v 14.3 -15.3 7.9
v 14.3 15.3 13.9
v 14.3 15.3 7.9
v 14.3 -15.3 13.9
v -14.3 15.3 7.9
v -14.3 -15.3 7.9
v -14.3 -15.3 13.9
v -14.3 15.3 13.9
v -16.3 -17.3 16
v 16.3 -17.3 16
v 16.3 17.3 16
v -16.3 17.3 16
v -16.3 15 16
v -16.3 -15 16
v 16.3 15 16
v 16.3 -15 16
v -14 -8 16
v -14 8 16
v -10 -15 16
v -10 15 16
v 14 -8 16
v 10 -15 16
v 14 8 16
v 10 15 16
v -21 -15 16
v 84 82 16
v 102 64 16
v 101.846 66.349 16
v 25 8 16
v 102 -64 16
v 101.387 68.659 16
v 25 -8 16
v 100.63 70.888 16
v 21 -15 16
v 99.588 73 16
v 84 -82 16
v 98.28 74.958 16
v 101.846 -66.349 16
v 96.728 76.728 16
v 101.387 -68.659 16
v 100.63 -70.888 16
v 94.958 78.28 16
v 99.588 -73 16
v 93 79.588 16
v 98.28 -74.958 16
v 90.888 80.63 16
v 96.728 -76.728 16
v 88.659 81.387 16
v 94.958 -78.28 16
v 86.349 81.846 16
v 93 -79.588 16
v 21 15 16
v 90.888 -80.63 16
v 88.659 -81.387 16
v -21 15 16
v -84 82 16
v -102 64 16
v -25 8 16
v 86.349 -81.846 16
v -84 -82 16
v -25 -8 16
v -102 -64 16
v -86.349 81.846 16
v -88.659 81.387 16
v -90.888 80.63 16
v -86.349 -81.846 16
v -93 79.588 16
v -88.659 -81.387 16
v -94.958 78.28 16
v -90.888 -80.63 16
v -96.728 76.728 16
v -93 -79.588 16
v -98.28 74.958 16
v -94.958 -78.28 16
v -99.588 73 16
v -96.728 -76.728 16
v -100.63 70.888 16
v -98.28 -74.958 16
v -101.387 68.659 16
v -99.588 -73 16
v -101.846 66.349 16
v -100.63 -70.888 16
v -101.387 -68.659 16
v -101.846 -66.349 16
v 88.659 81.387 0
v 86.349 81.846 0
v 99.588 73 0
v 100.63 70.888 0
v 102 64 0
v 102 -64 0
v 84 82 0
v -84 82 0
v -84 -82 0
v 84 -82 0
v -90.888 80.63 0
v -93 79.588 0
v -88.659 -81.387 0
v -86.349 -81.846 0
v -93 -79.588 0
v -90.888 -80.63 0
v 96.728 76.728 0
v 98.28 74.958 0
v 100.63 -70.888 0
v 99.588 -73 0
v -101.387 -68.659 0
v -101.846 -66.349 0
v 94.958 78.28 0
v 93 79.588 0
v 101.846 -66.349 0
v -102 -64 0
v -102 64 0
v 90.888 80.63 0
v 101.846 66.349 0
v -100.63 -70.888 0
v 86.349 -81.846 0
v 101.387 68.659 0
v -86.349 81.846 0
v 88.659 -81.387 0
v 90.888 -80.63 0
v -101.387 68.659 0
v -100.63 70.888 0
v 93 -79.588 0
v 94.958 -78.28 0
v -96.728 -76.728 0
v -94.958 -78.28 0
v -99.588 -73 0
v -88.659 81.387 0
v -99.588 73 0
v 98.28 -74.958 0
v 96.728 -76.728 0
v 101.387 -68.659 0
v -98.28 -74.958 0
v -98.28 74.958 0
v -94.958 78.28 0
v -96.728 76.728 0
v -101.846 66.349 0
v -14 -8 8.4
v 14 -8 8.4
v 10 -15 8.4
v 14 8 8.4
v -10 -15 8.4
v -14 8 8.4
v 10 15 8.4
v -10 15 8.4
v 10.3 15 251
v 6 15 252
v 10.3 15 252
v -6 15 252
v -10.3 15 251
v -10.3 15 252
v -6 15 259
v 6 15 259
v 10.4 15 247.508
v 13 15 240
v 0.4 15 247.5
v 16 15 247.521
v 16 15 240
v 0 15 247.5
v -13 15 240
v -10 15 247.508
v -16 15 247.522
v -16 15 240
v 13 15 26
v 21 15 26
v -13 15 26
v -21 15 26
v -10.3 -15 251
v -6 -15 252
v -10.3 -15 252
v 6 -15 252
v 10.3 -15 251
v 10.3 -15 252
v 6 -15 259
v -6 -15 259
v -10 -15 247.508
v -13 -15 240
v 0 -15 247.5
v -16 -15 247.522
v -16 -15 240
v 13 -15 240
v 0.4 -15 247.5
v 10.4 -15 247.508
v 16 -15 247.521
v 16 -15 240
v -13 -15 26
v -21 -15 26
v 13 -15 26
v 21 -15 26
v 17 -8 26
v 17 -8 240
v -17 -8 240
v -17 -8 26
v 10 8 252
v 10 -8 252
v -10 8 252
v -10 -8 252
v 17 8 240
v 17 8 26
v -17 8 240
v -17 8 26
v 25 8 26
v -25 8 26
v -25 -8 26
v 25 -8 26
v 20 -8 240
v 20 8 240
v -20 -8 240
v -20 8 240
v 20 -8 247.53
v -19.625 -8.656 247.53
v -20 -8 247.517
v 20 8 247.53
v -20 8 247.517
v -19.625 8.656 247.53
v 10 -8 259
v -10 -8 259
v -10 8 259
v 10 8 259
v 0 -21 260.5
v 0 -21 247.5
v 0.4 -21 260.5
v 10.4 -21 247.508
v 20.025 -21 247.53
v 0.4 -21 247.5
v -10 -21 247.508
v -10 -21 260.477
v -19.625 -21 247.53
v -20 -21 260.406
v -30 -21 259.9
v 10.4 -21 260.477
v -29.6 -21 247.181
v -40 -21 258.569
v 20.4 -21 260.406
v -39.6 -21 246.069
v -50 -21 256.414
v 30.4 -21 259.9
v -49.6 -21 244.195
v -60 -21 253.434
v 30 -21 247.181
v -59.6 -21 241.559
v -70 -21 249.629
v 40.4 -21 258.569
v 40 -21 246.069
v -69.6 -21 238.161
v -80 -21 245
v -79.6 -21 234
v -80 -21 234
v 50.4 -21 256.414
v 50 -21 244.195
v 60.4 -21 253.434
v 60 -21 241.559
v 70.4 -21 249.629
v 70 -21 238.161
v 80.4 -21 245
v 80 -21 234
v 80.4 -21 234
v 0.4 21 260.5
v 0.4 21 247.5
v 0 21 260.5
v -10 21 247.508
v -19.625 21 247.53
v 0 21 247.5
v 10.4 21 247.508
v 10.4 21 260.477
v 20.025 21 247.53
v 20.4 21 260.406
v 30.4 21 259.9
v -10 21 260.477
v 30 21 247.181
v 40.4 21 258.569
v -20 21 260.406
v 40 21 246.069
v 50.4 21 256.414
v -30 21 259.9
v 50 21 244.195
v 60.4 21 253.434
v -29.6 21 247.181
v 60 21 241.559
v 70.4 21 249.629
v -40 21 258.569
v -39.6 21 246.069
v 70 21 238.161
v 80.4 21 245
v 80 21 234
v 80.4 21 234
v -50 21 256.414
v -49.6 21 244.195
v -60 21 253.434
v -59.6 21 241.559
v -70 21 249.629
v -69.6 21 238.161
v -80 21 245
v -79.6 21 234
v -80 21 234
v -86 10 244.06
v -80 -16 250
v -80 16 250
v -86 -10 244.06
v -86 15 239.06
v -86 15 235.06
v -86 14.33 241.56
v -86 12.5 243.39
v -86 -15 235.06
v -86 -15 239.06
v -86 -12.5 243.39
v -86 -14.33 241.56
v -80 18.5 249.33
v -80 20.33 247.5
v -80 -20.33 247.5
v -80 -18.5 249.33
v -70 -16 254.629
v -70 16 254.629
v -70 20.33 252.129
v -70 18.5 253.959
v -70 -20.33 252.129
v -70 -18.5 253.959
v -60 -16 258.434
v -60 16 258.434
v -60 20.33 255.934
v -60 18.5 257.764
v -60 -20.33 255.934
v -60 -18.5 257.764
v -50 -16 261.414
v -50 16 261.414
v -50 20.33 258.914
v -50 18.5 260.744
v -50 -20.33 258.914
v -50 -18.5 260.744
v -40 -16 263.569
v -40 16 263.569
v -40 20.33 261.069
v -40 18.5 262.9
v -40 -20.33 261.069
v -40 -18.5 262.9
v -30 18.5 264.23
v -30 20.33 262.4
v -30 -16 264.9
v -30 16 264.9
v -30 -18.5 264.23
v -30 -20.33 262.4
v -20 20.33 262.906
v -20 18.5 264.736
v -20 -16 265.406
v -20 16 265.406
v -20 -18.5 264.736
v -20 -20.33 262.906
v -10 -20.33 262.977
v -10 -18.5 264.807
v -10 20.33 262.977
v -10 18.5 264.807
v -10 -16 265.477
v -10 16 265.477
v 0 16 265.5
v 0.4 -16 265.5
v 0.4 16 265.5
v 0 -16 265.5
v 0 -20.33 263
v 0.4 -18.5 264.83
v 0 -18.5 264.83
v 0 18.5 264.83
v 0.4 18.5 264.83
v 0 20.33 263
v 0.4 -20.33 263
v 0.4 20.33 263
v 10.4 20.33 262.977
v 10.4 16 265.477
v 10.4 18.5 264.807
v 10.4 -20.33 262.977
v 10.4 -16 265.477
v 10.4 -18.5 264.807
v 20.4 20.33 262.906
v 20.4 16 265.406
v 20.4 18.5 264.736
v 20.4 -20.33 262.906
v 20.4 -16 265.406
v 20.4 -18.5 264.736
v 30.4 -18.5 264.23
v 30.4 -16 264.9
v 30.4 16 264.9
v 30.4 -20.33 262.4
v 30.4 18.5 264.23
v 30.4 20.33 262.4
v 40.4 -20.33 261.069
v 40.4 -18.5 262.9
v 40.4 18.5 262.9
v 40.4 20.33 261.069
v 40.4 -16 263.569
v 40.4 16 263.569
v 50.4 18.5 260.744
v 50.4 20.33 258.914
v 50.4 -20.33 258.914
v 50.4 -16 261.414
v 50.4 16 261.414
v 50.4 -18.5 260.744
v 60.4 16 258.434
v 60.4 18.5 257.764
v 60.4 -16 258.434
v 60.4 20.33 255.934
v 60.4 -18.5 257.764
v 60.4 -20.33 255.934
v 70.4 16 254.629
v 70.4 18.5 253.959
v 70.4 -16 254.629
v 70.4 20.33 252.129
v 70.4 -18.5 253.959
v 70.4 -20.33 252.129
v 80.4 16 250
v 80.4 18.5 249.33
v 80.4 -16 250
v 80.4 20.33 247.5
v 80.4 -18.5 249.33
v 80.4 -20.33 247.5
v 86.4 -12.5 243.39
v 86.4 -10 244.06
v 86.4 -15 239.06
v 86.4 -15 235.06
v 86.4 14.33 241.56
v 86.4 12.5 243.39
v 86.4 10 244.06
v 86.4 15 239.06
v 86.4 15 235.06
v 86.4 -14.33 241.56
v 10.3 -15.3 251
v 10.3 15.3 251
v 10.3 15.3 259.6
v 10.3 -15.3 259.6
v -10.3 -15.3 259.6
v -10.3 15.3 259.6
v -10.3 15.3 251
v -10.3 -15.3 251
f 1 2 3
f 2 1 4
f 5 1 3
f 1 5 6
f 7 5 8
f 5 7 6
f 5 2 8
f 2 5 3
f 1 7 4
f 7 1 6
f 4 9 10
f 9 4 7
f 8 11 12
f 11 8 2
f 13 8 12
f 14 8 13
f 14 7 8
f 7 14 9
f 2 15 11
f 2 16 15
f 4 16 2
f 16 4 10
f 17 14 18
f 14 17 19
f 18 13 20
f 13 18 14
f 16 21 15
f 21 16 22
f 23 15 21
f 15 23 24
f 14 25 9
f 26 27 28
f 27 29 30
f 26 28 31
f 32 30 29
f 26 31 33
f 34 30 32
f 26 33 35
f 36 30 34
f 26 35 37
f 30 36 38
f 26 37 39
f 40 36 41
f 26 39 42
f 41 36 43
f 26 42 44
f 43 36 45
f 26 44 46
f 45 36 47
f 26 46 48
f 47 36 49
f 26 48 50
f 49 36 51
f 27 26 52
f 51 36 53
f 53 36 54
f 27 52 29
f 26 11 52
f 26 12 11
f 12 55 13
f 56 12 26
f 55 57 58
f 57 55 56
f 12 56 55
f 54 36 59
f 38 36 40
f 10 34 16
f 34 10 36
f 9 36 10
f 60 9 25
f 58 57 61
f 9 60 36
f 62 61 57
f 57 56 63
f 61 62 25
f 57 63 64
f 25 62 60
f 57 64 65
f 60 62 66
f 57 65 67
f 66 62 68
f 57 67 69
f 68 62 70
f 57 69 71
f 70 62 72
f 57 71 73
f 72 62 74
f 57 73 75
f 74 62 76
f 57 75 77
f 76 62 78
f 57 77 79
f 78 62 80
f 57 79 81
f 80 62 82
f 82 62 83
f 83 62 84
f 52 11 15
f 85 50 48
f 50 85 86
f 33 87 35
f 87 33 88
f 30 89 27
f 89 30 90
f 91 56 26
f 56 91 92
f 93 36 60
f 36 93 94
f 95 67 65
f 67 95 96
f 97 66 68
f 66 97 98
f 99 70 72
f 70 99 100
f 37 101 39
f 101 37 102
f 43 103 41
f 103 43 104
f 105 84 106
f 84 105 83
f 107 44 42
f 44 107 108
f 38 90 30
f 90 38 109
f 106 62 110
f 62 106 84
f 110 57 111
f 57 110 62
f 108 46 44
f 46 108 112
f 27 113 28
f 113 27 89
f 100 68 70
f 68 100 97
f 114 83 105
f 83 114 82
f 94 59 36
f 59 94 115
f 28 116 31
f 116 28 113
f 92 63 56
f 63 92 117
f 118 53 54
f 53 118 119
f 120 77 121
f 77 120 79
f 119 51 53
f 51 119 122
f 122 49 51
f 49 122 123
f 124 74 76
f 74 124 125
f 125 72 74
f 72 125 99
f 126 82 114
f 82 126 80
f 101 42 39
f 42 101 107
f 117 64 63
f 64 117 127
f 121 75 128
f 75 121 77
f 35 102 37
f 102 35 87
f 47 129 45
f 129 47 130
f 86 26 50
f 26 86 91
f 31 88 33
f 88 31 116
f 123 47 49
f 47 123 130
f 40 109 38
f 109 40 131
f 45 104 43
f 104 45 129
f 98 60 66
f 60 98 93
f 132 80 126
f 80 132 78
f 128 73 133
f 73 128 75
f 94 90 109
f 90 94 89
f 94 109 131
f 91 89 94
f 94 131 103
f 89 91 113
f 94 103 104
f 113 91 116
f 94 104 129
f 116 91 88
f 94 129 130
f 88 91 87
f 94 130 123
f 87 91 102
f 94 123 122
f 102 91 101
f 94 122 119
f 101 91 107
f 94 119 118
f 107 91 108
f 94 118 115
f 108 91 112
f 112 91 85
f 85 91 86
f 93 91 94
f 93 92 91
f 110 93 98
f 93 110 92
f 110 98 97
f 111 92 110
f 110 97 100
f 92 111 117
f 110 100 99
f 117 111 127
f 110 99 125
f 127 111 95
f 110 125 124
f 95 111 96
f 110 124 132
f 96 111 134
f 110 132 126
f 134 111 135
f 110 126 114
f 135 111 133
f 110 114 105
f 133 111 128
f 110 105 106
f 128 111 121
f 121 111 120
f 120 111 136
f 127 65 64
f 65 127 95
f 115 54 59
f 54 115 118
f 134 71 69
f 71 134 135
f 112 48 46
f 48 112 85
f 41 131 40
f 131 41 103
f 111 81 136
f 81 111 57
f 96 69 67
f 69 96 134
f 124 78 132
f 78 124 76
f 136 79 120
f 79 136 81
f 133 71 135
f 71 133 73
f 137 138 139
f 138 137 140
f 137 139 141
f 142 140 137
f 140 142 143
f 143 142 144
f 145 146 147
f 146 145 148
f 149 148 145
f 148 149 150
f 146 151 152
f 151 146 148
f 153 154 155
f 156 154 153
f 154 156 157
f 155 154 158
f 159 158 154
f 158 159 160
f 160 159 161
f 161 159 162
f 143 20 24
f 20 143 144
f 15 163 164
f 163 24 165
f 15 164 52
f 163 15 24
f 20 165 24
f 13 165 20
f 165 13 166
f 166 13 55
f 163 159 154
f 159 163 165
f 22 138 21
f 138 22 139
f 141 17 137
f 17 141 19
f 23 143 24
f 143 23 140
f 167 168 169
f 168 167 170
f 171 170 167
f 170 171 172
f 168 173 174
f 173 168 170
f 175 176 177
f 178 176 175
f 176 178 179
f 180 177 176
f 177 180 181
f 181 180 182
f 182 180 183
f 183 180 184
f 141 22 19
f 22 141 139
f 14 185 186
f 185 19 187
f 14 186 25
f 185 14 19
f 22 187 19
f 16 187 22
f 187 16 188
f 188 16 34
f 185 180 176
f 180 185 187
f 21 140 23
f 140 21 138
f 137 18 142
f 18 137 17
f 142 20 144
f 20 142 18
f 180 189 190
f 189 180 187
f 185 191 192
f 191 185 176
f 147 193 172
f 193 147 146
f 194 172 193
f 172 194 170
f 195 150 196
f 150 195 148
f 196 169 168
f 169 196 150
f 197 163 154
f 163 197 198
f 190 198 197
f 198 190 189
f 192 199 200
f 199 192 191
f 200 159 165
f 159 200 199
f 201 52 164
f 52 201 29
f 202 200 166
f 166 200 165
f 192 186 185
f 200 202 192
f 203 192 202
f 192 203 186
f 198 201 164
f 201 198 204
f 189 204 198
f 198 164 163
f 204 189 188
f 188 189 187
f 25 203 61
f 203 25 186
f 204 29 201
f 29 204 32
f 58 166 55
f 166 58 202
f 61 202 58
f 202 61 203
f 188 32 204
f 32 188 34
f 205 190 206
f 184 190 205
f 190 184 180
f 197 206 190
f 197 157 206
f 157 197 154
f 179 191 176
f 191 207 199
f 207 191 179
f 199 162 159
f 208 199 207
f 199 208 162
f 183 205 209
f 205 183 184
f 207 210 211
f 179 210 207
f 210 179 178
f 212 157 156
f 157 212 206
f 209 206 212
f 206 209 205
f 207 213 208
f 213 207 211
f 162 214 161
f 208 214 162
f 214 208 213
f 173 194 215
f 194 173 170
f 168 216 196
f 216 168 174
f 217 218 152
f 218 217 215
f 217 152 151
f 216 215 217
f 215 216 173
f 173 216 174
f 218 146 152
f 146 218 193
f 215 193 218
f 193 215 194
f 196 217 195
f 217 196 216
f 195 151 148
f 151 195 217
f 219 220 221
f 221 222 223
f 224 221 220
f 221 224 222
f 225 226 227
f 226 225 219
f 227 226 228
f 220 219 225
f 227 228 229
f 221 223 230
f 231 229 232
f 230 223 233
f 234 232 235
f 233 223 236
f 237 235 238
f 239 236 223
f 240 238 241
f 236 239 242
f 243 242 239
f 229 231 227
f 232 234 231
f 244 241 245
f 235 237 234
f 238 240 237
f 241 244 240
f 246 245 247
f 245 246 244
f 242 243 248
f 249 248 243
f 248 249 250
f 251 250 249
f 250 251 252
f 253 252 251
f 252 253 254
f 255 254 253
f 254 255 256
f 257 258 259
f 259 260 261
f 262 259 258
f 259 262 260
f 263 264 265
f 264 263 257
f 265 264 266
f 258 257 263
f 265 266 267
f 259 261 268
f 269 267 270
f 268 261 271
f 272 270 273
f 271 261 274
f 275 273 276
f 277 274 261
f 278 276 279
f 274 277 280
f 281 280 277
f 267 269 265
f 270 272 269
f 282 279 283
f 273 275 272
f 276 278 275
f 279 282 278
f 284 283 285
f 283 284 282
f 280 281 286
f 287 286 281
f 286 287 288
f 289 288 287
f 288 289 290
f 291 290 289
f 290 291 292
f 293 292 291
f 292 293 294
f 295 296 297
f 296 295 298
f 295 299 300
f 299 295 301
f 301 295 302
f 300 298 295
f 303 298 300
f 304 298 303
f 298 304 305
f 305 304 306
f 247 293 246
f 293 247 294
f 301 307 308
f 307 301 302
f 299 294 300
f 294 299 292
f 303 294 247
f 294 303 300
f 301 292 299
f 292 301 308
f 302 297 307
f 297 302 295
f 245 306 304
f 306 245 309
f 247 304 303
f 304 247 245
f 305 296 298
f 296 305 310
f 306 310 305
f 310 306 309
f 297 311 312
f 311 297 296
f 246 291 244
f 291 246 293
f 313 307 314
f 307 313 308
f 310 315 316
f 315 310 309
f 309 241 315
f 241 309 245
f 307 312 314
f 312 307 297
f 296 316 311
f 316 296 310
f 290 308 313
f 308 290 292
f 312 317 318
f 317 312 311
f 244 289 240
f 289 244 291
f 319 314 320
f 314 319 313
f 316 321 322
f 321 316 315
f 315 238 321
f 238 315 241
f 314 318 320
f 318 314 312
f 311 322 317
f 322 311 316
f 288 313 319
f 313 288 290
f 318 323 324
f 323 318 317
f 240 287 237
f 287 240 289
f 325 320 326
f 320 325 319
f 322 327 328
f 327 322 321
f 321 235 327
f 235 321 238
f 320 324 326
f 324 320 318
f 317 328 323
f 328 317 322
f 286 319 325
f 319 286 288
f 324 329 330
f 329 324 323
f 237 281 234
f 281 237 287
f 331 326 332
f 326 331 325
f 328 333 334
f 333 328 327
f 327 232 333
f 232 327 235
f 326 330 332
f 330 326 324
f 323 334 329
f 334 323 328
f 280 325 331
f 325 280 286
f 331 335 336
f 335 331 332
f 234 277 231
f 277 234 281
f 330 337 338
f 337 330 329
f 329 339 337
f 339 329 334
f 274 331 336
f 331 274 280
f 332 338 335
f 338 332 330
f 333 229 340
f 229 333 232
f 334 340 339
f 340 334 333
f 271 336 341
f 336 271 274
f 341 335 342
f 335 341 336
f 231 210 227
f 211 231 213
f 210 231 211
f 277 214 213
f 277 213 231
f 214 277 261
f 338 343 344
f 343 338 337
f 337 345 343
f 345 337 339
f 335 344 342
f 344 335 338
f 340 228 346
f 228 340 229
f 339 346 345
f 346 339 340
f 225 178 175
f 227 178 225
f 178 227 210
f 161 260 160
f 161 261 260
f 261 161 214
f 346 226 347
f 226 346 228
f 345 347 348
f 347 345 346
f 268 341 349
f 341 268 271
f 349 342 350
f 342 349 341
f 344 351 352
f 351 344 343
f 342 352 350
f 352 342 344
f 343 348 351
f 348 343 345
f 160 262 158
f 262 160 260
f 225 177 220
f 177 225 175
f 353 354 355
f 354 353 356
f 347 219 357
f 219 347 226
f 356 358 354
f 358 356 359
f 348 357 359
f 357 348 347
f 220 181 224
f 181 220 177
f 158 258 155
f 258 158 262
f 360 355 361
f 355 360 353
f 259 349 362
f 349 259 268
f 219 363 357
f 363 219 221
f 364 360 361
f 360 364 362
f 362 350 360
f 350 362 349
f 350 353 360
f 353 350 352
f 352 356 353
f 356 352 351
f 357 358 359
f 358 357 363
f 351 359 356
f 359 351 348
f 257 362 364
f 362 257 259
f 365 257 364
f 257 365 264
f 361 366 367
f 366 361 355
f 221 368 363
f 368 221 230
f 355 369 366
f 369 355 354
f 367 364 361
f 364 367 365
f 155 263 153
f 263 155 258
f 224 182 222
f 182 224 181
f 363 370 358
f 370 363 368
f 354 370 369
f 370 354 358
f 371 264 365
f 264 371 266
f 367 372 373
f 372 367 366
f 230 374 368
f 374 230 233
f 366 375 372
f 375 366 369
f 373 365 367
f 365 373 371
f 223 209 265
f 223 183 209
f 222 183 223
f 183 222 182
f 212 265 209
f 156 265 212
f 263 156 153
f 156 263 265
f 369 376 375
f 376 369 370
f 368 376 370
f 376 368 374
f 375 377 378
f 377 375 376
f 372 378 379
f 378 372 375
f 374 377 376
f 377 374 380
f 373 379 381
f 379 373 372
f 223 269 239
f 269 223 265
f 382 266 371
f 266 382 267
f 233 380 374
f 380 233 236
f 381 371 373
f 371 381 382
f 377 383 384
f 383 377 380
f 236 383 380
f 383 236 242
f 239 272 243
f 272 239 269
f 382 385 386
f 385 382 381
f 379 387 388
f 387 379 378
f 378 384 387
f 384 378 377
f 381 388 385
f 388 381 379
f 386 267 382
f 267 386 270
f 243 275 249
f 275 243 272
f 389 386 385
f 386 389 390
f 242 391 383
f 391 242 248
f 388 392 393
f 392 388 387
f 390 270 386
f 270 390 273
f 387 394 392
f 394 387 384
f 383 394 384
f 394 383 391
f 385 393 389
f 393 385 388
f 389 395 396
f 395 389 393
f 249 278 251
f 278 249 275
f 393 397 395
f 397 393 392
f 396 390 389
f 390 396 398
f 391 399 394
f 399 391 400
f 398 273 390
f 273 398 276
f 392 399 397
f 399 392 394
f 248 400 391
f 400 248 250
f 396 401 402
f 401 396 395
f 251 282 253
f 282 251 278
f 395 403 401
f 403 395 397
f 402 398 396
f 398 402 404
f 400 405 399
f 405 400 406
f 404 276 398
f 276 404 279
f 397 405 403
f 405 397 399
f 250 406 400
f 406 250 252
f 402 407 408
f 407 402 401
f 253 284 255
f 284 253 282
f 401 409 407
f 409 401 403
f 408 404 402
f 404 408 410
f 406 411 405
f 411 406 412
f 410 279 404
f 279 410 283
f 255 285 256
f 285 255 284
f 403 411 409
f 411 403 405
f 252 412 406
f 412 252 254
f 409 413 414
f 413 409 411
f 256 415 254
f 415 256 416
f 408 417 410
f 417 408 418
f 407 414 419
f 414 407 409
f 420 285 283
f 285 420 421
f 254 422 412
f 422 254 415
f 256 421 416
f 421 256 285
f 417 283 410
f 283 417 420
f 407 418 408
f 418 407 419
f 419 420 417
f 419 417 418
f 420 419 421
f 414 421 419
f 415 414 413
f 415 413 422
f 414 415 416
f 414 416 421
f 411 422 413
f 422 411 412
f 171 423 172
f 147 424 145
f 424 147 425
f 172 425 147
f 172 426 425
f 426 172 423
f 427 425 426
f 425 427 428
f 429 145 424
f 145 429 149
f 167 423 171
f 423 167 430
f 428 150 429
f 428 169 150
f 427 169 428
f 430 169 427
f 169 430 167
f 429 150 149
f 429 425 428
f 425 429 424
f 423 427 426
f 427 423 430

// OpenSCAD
// Headphone stand in three printed parts: base, post and hanger.
// No glue and no screws. Rectangular (non-round) tenons prevent rotation.
// Units: mm. Printed in PLA, 0.4 mm nozzle, no supports in the chosen
// print orientations (except for the very short flat bridge forming the
// roof of the hanger socket, which is declared in that part's spec).

part = "assembly"; // ["base", "post", "hanger", "assembly"]

$fn = 48;

/* Design parameters */
fit_clear = 0.3;          // clearance per side at both tenon joints

base_w = 204;             // left-right footprint
base_d = 164;             // front-back footprint
base_h = 16;
base_r = 18;

pocket_w = 28 + 2 * fit_clear;   // 28.6
pocket_d = 30 + 2 * fit_clear;   // 30.6
pocket_depth = 8;
pocket_floor = base_h - pocket_depth; // z = 8

post_bottom = pocket_floor + 0.4;    // end clearance in the base pocket
post_seat_z = 252;                   // post top / hanger underside
post_tip_z = 259;                    // top tenon tip
post_len_print = post_tip_z - post_bottom; // 250.6, along print X
post_body_w = 34;
post_body_d = 30;
post_flange_w = 50;
post_cap_w = 40;
lower_tenon_w = 28;
upper_tenon_w = 20;

hang_seat_z = 252;
hang_top_z = 270;
hang_len = 172;           // x = -86..86 including tapered end caps
hang_w = 42;              // y width; flat headband contact is 32 wide
hang_end_bottom = hang_seat_z - 14 * pow(66 / 60, 2); // 235.06 at |x|=86
hang_print_ymax = hang_top_z - hang_end_bottom;      // 34.94

socket_w = upper_tenon_w + 2 * fit_clear; // 20.6 in x
socket_d = post_body_d + 2 * fit_clear;   // 30.6 in y
socket_top_z = 259.6;

/* Cross-section helpers */

// Rectangle in XY with all four corners cut. lx is the cut leg along X,
// ly is the cut leg along Y. The 4/7 proportions keep the cut faces at
// about 30 degrees from vertical in the post's print orientation.
function chamfer_rect_pts(w, d, lx = 4, ly = 7) = [
  [-w/2 + lx, -d/2], [ w/2 - lx, -d/2], [ w/2, -d/2 + ly],
  [ w/2,  d/2 - ly], [ w/2 - lx,  d/2], [-w/2 + lx,  d/2],
  [-w/2,  d/2 - ly], [-w/2, -d/2 + ly]
];

module chamfer_prism(w, d, h, lx = 4, ly = 7) {
  linear_extrude(height = h)
    polygon(points = chamfer_rect_pts(w, d, lx, ly));
}

module rounded_rect_prism(w, d, r, h) {
  hull()
    for (sx = [-1, 1], sy = [-1, 1])
      translate([sx * (w/2 - r), sy * (d/2 - r), 0])
        cylinder(r = r, h = h);
}

/* ---------------- Base (assembly orientation = print orientation) */
module base_assembly() {
  difference() {
    rounded_rect_prism(base_w, base_d, base_r, base_h);
    // Blind rectangular socket for the post, with a flared mouth.
    union() {
      translate([0, 0, pocket_floor - 0.1])
        cube([pocket_w, pocket_d, base_h - pocket_floor - 1.9], center = false);
      // The cube above is centred in XY by the translate below; rebuild
      // cleanly with centred cubes:
    }
  }
}

// The base is built again here without the placeholder difference above.
// (base_assembly is not used; see base_geometry.)
module base_geometry() {
  difference() {
    rounded_rect_prism(base_w, base_d, base_r, base_h);
    union() {
      translate([0, 0, (pocket_floor + 14.1) / 2])
        cube([pocket_w, pocket_d, 14.1 - pocket_floor + 0.2], center = true);
      hull() {
        translate([0, 0, 14.0])
          cube([pocket_w, pocket_d, 0.2], center = true);
        translate([0, 0, base_h + 0.1])
          cube([pocket_w + 4, pocket_d + 4, 0.2], center = true);
      }
    }
  }
}

module base_part() {
  base_geometry();
}

/* ---------------- Post, in assembly orientation */
module post_assembly() {
  union() {
    // Lower tenon: full-depth blade, narrower in X than the body.
    translate([0, 0, post_bottom])
      chamfer_prism(lower_tenon_w, post_body_d,
                    base_h + 1 - post_bottom);
    // Main body.
    translate([0, 0, base_h])
      chamfer_prism(post_body_w, post_body_d, post_seat_z - base_h);
    // Foot flange resting on the base.
    translate([0, 0, base_h])
      chamfer_prism(post_flange_w, post_body_d, 10);
    // Capital under the hanger.
    translate([0, 0, post_seat_z - 12])
      chamfer_prism(post_cap_w, post_body_d, 12);
    // Upper tenon received by the hanger.
    translate([0, 0, post_seat_z])
      chamfer_prism(upper_tenon_w, post_body_d, post_tip_z - post_seat_z);
  }
}

// Print orientation: length along +X, the assembly -Y face on the bed.
// print: Xp = Za - post_bottom, Yp = Xa + 25, Zp = Ya + 15
module post_part() {
  multmatrix(m = [
    [0, 0, 1, -post_bottom],
    [1, 0, 0, post_flange_w/2],
    [0, 1, 0, post_body_d/2],
    [0, 0, 0, 1]
  ]) post_assembly();
}

/* ---------------- Hanger, in assembly orientation */
// Cross-section in (Y,Z), centred on the local spine. hw is half width,
// t is local vertical thickness. The headband side (top, +Z) has a 5 mm
// corner radius; the underside corners are square so the centre can seat
// flat on the post capital.
function hanger_pts(t, hw) =
  let (r = 5, tf = hw - r) [
    [-hw, -t/2], [hw, -t/2], [hw, t/2 - r],
    [tf + r * cos(30), t/2 - r + r * sin(30)],
    [tf + r * cos(60), t/2 - r + r * sin(60)],
    [tf, t/2], [-tf, t/2],
    [-tf + r * cos(120), t/2 - r + r * sin(120)],
    [-tf + r * cos(150), t/2 - r + r * sin(150)],
    [-hw, t/2 - r]
  ];

function hang_bottom(x) =
  let (ax = abs(x))
    ax <= 20 ? hang_seat_z
             : hang_seat_z - 14 * pow((ax - 20) / 60, 2);

function hang_thick(x) = 18 - 2 * pow(abs(x) / 80, 2);

// [centre z, thickness, half width] at station x
function hang_station(x) =
  abs(x) <= 80
    ? [(hang_bottom(x) + hang_thick(x) / 2 + hang_bottom(x)) / 2,
       hang_thick(x), hang_w / 2]
    : [(hang_end_bottom + 9 / 2), 9, 15];

hang_xs = concat([-86], [for (i = [-8 : 8]) i * 10], [86]);

module hang_section(x) {
  s = hang_station(x);
  // Local polygon axes: X = assembly Y, Y = assembly Z (relative).
  // Slice thickness is local Z, mapped to assembly X.
  multmatrix(m = [
    [0, 0, 1, x],
    [1, 0, 0, 0],
    [0, 1, 0, s[0]],
    [0, 0, 0, 1]
  ])
    linear_extrude(height = 0.4)
      polygon(points = hanger_pts(s[1], s[2]));
}

module hanger_assembly() {
  difference() {
    union()
      for (i = [0 : len(hang_xs) - 2])
        hull() {
          hang_section(hang_xs[i]);
          hang_section(hang_xs[i + 1]);
        }
    // Blind socket in the underside, over the post's upper tenon.
    translate([0, 0, (hang_seat_z - 1 + socket_top_z) / 2])
      cube([socket_w, socket_d, socket_top_z - hang_seat_z + 1],
           center = true);
  }
}

// Print orientation: on one 42 mm side face. Xp = Xa,
// Yp = hang_top_z - Za, Zp = Ya + hang_w/2. Bed is Zp = 0.
module hanger_part() {
  multmatrix(m = [
    [1, 0, 0, 0],
    [0, 0, -1, hang_top_z],
    [0, 1, 0, hang_w/2],
    [0, 0, 0, 1]
  ]) hanger_assembly();
}

/* ---------------- Specs and part selection */

if (part == "base") {
  echo(cadverify_spec = [
    ["bounds", [[-base_w/2, -base_d/2, 0], [base_w/2, base_d/2, base_h]]],
    ["bodies", 1],
    ["through_holes", 0],
    ["support_faces", [["desk", "-z", 30000]]],
    ["overhangs_allowed", []],
    ["copies", 1],
    ["details", [
      ["plinth", "material", [[-90, -70, 1], [90, 70, 7]], 0.95],
      ["socket", "void", [[-13, -14, 9], [13, 14, 15]], 0.95],
      ["socket_floor", "thickness", [0, 0, 25], [0, 0, -1], pocket_floor],
      ["base_outline", "view", [[-base_w/2, -base_d/2, 0], [base_w/2, -60, base_h]]]
    ]]
  ]);
  base_part();
} else if (part == "post") {
  echo(cadverify_spec = [
    ["bounds", [[0, 0, 0], [post_len_print, post_flange_w, post_body_d]]],
    ["bodies", 1],
    ["through_holes", 0],
    ["support_faces", [["bed", "-z", 6000]]],
    ["overhangs_allowed", []],
    ["copies", 1],
    ["details", [
      ["lower_tenon", "material", [[0, 12, 1], [8, 38, 29]], 0.90],
      ["foot_flange", "material", [[8, 2, 8], [18, 48, 22]], 0.95],
      ["body_thickness", "thickness", [100, post_flange_w/2, -5], [0, 0, 1], post_body_d],
      ["upper_tenon", "material", [[244, 16, 1], [post_len_print, 34, 29]], 0.90],
      ["upper_tenon_end", "view", [[240, 10, 0], [post_len_print, 40, post_body_d]]]
    ]]
  ]);
  post_part();
} else if (part == "hanger") {
  echo(cadverify_spec = [
    ["bounds", [[-hang_len/2, 0, 0], [hang_len/2, hang_print_ymax, hang_w]]],
    ["bodies", 1],
    ["through_holes", 0],
    ["support_faces", [["bed", "-z", 1900]]],
    ["overhangs_allowed", [
      ["roof of the blind hanger socket is a flat bridge of about 8 mm in the print-Y direction and prints support-free in PLA",
        [[-11, 10, 34], [11, 19, 37]]]
    ]],
    ["copies", 1],
    ["details", [
      ["socket", "void", [[-9, 11, 7], [9, 18, 35]], 0.95],
      ["saddle_flat", "material", [[-20, 1, 5], [20, 4, 37]], 0.90],
      ["saddle_profile_thickness", "thickness", [30, -5, hang_w/2], [0, 1, 0], 17.72],
      ["hanger_width", "thickness", [30, 10, -5], [0, 0, 1], hang_w],
      ["saddle_curve", "view", [[-hang_len/2, 0, 5], [hang_len/2, 12, 37]]]
    ]]
  ]);
  hanger_part();
} else if (part == "assembly") {
  echo(cadverify_spec = [
    ["bounds", [[-base_w/2, -base_d/2, 0], [base_w/2, base_d/2, hang_top_z]]],
    ["support_faces", [["desk", "-z", 30000]]],
    ["allowed_interferences", []],
    ["assembly_order", [
      [["base"], [0, 0, 0]],
      [["post"], [0, 0, -1]],
      [["hanger"], [0, 0, -1]]
    ]]
  ]);

  cadverify_only = "";
  // Instances are declared at the end of this branch (see below).
  assembly_instances();
}

module assembly_instances() {
  instance("base", "base")
    base_part();

  // Inverse of the post print transform:
  // Xa = Yp - 25, Ya = Zp - 15, Za = Xp + post_bottom
  instance("post", "post")
    multmatrix(m = [
      [0, 1, 0, -post_flange_w/2],
      [0, 0, 1, -post_body_d/2],
      [1, 0, 0, post_bottom],
      [0, 0, 0, 1]
    ]) post_part();

  // Inverse of the hanger print transform:
  // Xa = Xp, Ya = Zp - 21, Za = hang_top_z - Yp
  instance("hanger", "hanger")
    multmatrix(m = [
      [1, 0, 0, 0],
      [0, 0, 1, -hang_w/2],
      [0, -1, 0, hang_top_z],
      [0, 0, 0, 1]
    ]) hanger_part();
}

cadverify_only = "";
module instance(name, part_name, unit = 1) {
  echo(cadverify_instance = [name, part_name, unit]);
  if (cadverify_only == "" || cadverify_only == name) children();
}
